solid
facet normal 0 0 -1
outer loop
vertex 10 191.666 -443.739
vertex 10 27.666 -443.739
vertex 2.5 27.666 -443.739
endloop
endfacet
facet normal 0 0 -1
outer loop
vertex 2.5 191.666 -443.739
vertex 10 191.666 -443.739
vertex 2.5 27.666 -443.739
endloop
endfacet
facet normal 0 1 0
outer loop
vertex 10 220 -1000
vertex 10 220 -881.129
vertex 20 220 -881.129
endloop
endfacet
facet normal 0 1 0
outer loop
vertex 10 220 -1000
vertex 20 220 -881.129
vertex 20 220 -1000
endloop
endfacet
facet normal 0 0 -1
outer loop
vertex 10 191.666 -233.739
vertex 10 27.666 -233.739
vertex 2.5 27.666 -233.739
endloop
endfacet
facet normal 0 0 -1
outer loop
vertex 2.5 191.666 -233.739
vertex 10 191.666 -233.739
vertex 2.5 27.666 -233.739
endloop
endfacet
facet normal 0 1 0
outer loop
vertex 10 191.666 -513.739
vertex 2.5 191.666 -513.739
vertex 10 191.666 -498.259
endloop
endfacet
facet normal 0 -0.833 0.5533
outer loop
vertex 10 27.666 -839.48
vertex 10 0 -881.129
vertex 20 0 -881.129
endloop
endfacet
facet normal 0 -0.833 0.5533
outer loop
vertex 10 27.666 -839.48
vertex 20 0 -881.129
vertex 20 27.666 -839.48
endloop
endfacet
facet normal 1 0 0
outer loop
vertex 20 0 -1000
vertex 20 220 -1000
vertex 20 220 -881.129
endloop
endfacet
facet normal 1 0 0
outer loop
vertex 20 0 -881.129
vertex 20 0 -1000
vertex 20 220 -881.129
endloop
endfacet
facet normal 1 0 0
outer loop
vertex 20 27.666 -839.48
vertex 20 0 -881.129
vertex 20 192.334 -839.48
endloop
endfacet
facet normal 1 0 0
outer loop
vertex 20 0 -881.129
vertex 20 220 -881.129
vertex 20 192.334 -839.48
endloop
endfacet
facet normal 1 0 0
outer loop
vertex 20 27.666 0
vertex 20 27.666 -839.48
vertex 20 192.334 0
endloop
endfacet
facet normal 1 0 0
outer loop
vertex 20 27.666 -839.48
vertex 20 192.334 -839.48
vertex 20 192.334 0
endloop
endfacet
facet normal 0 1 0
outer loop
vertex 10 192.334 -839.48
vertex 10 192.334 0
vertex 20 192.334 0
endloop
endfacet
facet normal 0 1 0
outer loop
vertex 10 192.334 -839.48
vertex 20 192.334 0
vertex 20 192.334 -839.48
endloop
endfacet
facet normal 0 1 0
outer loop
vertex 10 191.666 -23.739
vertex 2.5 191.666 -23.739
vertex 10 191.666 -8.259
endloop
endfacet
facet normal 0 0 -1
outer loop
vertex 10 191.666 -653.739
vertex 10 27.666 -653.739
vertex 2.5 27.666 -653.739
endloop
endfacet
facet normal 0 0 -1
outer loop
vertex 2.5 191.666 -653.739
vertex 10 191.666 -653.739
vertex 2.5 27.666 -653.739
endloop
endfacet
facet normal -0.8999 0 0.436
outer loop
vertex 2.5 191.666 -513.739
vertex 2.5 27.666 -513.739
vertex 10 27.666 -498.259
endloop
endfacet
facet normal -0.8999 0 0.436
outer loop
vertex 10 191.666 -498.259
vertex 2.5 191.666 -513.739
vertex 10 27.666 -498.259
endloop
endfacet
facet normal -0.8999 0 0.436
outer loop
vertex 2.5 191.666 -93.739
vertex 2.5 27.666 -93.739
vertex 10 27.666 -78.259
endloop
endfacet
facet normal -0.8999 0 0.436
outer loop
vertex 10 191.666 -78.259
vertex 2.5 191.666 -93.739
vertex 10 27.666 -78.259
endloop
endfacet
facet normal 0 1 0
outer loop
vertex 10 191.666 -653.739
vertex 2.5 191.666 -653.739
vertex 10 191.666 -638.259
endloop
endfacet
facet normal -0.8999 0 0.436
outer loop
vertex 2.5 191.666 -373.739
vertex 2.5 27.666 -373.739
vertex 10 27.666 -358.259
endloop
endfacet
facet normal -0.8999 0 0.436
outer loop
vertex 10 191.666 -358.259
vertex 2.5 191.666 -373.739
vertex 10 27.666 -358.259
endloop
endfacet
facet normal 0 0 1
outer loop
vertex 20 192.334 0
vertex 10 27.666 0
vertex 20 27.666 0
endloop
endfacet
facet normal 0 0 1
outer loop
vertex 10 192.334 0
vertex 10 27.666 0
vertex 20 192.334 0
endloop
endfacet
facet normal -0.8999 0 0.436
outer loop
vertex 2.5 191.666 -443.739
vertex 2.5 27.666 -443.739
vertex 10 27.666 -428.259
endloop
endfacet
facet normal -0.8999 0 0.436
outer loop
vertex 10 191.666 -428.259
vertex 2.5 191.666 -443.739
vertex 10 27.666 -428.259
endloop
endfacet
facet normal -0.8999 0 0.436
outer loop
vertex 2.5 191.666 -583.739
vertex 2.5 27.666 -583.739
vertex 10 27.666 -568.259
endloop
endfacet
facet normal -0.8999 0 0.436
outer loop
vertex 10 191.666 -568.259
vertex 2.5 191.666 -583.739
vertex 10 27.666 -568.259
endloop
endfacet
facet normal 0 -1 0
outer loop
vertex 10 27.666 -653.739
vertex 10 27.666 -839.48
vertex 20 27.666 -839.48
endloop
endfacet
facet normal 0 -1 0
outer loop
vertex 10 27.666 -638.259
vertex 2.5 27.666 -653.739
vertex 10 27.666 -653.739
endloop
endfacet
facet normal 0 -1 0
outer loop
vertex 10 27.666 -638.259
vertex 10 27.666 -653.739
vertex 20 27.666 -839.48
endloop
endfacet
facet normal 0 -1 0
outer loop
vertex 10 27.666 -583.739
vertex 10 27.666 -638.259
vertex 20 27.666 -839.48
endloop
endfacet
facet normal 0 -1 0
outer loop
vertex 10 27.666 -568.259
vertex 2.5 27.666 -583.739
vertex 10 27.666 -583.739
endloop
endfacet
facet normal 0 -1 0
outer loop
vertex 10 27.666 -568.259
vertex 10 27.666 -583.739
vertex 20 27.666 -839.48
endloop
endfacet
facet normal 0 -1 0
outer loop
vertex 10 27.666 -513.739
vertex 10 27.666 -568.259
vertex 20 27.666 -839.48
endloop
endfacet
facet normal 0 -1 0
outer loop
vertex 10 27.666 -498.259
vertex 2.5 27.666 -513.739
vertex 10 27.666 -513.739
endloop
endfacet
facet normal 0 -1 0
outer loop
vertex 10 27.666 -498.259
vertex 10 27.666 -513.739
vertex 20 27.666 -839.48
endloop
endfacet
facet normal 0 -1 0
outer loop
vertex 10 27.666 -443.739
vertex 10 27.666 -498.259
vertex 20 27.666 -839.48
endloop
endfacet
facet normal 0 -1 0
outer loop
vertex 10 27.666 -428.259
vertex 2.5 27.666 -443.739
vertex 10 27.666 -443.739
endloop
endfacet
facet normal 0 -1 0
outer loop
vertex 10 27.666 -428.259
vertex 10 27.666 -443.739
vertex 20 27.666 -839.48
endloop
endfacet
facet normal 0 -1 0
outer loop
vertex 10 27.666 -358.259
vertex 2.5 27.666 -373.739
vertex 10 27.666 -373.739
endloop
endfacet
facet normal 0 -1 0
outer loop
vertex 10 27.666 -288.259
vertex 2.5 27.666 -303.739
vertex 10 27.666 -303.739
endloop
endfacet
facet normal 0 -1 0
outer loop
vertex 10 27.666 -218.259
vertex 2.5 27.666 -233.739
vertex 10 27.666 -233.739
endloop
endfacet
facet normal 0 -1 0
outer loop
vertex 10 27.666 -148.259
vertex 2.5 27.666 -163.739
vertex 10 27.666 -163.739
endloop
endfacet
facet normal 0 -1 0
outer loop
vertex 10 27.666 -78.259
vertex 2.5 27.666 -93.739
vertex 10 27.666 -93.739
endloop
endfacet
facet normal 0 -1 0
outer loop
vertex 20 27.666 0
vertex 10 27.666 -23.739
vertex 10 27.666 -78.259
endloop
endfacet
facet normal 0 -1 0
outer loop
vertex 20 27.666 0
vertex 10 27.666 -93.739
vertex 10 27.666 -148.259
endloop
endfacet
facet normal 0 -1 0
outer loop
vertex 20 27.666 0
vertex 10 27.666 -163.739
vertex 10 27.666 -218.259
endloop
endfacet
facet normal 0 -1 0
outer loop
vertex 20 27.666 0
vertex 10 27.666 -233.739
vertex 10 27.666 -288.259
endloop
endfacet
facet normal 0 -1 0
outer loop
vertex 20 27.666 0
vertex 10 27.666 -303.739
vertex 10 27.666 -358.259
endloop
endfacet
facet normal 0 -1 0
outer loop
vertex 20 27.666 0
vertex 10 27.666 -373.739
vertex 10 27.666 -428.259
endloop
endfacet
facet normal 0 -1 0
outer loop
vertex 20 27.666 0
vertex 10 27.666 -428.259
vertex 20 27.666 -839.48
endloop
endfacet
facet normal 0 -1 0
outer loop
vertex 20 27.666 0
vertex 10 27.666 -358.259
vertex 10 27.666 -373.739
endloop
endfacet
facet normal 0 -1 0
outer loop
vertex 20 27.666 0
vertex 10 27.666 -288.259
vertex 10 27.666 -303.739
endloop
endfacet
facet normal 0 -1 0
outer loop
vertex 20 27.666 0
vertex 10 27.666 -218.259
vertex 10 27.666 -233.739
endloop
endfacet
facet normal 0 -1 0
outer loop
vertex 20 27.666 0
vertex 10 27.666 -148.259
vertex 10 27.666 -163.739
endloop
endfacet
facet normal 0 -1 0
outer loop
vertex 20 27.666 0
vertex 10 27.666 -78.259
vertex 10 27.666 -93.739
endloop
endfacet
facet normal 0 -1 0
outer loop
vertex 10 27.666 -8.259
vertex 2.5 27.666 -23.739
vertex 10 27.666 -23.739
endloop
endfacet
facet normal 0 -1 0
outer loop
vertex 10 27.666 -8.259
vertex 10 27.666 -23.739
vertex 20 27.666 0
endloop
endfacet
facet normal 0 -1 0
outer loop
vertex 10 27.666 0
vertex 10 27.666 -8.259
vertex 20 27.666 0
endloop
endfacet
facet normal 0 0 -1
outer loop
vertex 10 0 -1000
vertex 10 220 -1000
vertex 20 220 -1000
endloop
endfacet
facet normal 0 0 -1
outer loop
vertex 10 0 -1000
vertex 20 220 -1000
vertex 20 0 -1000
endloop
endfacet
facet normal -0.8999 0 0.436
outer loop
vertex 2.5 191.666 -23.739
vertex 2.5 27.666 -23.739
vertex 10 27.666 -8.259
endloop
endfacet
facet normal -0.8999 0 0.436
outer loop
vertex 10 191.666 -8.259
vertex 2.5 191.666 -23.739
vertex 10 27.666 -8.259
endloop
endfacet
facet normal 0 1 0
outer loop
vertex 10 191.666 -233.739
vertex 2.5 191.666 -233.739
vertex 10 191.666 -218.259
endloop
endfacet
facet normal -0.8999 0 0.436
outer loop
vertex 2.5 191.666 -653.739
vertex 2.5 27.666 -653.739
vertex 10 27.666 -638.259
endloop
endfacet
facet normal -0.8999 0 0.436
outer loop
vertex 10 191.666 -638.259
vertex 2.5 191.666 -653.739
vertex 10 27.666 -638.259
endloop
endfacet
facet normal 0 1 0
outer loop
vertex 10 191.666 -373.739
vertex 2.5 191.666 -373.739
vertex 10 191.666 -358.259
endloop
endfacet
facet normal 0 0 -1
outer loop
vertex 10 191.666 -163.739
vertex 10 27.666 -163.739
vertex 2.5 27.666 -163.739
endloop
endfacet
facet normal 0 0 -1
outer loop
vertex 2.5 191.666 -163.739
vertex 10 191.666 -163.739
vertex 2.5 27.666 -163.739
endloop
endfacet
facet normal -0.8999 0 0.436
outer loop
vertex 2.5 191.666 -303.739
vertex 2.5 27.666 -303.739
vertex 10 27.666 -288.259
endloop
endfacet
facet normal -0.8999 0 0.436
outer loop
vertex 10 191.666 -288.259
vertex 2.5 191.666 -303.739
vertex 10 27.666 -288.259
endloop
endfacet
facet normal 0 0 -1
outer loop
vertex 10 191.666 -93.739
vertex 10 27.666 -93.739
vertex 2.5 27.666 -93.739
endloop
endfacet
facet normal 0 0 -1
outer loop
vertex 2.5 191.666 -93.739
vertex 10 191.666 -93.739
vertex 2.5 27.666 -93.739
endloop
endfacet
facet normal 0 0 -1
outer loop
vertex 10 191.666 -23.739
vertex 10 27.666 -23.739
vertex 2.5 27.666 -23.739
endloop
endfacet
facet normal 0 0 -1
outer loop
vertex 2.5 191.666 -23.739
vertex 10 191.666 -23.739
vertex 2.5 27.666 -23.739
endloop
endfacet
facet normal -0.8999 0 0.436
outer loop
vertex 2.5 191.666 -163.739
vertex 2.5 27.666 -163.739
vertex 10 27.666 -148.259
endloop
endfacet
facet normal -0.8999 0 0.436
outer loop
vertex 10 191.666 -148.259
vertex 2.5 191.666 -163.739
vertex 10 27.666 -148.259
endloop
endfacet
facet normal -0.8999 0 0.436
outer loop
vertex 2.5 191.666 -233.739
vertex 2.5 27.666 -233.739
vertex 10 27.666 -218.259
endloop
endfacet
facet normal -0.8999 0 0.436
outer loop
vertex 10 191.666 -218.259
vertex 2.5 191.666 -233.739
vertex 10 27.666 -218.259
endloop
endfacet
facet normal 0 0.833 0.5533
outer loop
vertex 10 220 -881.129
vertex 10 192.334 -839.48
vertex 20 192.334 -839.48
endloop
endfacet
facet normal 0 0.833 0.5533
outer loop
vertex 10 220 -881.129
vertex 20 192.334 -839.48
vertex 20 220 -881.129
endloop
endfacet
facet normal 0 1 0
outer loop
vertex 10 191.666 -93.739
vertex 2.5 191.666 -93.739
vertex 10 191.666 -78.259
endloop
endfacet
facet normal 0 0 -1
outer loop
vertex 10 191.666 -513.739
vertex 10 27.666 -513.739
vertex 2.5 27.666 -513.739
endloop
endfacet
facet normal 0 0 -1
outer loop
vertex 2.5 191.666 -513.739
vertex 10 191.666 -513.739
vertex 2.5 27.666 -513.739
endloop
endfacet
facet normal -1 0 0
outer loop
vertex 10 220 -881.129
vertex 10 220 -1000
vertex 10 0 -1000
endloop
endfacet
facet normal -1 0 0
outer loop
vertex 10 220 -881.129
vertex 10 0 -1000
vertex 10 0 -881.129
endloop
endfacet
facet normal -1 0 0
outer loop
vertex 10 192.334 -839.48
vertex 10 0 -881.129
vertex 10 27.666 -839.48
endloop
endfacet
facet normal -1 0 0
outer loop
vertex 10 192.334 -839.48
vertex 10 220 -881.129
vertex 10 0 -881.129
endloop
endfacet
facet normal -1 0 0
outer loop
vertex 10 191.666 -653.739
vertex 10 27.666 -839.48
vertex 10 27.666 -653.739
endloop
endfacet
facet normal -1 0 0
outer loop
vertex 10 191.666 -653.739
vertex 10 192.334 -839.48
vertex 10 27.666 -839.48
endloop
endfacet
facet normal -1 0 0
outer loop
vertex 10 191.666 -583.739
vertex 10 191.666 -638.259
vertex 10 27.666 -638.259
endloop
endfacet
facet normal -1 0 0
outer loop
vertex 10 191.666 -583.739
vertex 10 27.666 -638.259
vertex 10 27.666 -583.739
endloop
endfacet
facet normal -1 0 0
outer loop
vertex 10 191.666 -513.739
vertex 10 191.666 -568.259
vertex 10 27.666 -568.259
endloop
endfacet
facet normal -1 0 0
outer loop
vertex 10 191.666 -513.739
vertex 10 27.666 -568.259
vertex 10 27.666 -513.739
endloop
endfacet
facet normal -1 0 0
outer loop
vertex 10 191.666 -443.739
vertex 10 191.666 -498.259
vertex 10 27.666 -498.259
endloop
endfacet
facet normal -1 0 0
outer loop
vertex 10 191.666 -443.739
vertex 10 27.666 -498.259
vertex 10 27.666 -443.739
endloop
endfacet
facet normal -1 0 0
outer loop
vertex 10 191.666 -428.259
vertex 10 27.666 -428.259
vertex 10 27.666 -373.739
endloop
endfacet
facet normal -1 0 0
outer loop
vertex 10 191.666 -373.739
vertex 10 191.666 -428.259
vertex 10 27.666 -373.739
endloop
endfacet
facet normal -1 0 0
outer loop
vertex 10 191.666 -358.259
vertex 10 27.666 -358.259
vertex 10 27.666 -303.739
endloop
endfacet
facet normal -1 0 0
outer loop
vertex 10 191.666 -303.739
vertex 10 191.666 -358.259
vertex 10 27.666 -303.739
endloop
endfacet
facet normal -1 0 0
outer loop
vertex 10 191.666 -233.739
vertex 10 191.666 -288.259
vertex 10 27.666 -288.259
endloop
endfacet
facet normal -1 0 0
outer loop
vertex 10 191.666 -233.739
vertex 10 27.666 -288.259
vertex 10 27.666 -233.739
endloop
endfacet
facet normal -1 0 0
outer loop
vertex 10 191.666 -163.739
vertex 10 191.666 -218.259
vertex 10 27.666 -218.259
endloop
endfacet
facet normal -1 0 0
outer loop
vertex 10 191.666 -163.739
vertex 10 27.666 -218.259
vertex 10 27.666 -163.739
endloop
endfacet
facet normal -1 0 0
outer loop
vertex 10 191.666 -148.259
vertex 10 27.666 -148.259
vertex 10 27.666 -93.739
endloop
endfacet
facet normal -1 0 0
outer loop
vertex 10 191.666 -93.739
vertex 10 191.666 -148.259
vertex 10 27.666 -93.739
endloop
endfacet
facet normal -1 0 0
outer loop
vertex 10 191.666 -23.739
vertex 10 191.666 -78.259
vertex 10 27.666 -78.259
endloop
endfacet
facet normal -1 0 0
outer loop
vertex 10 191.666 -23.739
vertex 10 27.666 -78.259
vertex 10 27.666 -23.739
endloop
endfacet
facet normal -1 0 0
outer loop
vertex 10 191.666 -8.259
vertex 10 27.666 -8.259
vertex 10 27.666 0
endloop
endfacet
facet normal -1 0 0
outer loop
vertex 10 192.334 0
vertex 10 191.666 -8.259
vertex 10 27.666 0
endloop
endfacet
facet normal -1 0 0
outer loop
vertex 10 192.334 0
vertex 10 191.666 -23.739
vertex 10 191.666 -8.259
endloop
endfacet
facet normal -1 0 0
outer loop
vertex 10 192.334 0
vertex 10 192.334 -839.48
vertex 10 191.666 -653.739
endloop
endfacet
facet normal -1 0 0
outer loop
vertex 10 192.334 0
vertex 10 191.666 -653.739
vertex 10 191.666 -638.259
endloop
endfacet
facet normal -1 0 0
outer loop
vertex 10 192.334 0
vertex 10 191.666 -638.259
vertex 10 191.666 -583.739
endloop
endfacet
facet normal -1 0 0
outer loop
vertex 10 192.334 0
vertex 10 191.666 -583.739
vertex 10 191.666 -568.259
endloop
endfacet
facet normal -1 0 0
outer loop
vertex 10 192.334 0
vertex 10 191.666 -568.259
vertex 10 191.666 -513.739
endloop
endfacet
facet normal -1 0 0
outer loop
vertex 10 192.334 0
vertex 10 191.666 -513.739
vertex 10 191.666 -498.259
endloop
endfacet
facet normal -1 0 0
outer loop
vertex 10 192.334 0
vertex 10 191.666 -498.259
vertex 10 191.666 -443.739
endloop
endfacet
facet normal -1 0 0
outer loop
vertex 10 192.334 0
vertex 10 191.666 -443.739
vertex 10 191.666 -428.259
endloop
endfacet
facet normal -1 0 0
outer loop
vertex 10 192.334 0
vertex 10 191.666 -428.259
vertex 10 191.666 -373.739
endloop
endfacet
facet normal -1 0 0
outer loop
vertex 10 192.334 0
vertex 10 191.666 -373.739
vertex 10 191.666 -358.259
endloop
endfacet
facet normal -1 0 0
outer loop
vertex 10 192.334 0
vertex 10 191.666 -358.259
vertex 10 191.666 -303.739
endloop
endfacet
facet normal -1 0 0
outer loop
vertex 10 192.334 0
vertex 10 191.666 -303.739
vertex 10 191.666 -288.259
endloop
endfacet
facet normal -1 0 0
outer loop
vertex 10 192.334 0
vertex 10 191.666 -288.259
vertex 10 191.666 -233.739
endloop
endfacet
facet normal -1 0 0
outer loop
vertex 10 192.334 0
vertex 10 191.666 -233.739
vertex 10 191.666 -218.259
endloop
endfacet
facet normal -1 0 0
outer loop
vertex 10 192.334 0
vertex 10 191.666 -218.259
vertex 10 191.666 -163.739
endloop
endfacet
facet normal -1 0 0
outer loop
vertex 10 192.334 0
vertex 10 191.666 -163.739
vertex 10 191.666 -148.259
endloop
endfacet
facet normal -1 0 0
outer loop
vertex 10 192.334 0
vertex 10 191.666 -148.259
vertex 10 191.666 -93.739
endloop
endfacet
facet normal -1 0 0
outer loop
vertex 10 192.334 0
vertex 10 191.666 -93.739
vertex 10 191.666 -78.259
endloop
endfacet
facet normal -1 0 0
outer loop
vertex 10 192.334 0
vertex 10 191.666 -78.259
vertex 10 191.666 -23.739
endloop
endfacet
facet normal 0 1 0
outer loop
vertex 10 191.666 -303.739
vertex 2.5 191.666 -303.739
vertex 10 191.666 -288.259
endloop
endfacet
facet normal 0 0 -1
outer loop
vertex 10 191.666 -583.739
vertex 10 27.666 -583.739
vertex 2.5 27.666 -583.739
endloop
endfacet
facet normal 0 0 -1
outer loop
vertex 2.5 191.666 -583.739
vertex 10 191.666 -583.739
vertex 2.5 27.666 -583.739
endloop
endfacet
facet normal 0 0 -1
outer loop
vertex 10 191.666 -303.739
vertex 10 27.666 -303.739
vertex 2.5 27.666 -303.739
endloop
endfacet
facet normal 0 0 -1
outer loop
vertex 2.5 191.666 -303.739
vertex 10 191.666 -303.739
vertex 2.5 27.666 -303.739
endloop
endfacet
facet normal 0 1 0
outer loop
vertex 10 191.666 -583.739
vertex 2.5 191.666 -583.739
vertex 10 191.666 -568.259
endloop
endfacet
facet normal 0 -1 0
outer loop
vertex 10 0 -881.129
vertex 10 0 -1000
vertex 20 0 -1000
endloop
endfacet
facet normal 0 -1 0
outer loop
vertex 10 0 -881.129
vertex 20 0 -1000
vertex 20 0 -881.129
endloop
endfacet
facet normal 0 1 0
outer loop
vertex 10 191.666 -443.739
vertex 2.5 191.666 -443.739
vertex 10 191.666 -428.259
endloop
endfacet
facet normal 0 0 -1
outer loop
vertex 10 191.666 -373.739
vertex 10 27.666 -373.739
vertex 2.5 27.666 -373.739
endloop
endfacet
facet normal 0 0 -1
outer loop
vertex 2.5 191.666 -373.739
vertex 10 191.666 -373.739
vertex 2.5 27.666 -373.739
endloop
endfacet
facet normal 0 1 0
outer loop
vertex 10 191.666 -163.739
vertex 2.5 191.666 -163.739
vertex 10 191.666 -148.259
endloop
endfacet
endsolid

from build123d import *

# Parameters (mm, degrees)
BOSS_EXTRUDE1_DEPTH = 10
BOSS_EXTRUDE2_DEPTH = 164
LPATTERN1_COUNT     = 10
LPATTERN1_PITCH     = 70


with BuildPart() as part:
    # Sketch5 → Boss-Extrude1 (new body)
    with BuildSketch(Plane(origin=(10, 0, 0), x_dir=(0, 0, -1), z_dir=(1, 0, 0))):
        Polygon((1000, 220), (1000, 0), (881.128856778, 0), (839.480242444, 27.665735559), (0, 27.665735559), (0, 192.334264441), (839.480242444, 192.334264441), (881.128856778, 220), align=None)
    extrude(amount=BOSS_EXTRUDE1_DEPTH)

    # Sketch6 → Boss-Extrude2 (add)
    with BuildSketch(Plane(origin=(0, 27.665735559, 0), x_dir=(-1, 0, 0), z_dir=(0, -1, 0))):
        Polygon((-10, 23.738513139), (-2.5, 23.738513139), (-10, 8.259066754), align=None)
    boss_extrude2 = extrude(amount=-BOSS_EXTRUDE2_DEPTH)

    # LPattern1: Boss-Extrude2 ×10
    with Locations(*[(0, 0, -i * LPATTERN1_PITCH) for i in range(1, LPATTERN1_COUNT)]):
        add(boss_extrude2)


solid = part.part
